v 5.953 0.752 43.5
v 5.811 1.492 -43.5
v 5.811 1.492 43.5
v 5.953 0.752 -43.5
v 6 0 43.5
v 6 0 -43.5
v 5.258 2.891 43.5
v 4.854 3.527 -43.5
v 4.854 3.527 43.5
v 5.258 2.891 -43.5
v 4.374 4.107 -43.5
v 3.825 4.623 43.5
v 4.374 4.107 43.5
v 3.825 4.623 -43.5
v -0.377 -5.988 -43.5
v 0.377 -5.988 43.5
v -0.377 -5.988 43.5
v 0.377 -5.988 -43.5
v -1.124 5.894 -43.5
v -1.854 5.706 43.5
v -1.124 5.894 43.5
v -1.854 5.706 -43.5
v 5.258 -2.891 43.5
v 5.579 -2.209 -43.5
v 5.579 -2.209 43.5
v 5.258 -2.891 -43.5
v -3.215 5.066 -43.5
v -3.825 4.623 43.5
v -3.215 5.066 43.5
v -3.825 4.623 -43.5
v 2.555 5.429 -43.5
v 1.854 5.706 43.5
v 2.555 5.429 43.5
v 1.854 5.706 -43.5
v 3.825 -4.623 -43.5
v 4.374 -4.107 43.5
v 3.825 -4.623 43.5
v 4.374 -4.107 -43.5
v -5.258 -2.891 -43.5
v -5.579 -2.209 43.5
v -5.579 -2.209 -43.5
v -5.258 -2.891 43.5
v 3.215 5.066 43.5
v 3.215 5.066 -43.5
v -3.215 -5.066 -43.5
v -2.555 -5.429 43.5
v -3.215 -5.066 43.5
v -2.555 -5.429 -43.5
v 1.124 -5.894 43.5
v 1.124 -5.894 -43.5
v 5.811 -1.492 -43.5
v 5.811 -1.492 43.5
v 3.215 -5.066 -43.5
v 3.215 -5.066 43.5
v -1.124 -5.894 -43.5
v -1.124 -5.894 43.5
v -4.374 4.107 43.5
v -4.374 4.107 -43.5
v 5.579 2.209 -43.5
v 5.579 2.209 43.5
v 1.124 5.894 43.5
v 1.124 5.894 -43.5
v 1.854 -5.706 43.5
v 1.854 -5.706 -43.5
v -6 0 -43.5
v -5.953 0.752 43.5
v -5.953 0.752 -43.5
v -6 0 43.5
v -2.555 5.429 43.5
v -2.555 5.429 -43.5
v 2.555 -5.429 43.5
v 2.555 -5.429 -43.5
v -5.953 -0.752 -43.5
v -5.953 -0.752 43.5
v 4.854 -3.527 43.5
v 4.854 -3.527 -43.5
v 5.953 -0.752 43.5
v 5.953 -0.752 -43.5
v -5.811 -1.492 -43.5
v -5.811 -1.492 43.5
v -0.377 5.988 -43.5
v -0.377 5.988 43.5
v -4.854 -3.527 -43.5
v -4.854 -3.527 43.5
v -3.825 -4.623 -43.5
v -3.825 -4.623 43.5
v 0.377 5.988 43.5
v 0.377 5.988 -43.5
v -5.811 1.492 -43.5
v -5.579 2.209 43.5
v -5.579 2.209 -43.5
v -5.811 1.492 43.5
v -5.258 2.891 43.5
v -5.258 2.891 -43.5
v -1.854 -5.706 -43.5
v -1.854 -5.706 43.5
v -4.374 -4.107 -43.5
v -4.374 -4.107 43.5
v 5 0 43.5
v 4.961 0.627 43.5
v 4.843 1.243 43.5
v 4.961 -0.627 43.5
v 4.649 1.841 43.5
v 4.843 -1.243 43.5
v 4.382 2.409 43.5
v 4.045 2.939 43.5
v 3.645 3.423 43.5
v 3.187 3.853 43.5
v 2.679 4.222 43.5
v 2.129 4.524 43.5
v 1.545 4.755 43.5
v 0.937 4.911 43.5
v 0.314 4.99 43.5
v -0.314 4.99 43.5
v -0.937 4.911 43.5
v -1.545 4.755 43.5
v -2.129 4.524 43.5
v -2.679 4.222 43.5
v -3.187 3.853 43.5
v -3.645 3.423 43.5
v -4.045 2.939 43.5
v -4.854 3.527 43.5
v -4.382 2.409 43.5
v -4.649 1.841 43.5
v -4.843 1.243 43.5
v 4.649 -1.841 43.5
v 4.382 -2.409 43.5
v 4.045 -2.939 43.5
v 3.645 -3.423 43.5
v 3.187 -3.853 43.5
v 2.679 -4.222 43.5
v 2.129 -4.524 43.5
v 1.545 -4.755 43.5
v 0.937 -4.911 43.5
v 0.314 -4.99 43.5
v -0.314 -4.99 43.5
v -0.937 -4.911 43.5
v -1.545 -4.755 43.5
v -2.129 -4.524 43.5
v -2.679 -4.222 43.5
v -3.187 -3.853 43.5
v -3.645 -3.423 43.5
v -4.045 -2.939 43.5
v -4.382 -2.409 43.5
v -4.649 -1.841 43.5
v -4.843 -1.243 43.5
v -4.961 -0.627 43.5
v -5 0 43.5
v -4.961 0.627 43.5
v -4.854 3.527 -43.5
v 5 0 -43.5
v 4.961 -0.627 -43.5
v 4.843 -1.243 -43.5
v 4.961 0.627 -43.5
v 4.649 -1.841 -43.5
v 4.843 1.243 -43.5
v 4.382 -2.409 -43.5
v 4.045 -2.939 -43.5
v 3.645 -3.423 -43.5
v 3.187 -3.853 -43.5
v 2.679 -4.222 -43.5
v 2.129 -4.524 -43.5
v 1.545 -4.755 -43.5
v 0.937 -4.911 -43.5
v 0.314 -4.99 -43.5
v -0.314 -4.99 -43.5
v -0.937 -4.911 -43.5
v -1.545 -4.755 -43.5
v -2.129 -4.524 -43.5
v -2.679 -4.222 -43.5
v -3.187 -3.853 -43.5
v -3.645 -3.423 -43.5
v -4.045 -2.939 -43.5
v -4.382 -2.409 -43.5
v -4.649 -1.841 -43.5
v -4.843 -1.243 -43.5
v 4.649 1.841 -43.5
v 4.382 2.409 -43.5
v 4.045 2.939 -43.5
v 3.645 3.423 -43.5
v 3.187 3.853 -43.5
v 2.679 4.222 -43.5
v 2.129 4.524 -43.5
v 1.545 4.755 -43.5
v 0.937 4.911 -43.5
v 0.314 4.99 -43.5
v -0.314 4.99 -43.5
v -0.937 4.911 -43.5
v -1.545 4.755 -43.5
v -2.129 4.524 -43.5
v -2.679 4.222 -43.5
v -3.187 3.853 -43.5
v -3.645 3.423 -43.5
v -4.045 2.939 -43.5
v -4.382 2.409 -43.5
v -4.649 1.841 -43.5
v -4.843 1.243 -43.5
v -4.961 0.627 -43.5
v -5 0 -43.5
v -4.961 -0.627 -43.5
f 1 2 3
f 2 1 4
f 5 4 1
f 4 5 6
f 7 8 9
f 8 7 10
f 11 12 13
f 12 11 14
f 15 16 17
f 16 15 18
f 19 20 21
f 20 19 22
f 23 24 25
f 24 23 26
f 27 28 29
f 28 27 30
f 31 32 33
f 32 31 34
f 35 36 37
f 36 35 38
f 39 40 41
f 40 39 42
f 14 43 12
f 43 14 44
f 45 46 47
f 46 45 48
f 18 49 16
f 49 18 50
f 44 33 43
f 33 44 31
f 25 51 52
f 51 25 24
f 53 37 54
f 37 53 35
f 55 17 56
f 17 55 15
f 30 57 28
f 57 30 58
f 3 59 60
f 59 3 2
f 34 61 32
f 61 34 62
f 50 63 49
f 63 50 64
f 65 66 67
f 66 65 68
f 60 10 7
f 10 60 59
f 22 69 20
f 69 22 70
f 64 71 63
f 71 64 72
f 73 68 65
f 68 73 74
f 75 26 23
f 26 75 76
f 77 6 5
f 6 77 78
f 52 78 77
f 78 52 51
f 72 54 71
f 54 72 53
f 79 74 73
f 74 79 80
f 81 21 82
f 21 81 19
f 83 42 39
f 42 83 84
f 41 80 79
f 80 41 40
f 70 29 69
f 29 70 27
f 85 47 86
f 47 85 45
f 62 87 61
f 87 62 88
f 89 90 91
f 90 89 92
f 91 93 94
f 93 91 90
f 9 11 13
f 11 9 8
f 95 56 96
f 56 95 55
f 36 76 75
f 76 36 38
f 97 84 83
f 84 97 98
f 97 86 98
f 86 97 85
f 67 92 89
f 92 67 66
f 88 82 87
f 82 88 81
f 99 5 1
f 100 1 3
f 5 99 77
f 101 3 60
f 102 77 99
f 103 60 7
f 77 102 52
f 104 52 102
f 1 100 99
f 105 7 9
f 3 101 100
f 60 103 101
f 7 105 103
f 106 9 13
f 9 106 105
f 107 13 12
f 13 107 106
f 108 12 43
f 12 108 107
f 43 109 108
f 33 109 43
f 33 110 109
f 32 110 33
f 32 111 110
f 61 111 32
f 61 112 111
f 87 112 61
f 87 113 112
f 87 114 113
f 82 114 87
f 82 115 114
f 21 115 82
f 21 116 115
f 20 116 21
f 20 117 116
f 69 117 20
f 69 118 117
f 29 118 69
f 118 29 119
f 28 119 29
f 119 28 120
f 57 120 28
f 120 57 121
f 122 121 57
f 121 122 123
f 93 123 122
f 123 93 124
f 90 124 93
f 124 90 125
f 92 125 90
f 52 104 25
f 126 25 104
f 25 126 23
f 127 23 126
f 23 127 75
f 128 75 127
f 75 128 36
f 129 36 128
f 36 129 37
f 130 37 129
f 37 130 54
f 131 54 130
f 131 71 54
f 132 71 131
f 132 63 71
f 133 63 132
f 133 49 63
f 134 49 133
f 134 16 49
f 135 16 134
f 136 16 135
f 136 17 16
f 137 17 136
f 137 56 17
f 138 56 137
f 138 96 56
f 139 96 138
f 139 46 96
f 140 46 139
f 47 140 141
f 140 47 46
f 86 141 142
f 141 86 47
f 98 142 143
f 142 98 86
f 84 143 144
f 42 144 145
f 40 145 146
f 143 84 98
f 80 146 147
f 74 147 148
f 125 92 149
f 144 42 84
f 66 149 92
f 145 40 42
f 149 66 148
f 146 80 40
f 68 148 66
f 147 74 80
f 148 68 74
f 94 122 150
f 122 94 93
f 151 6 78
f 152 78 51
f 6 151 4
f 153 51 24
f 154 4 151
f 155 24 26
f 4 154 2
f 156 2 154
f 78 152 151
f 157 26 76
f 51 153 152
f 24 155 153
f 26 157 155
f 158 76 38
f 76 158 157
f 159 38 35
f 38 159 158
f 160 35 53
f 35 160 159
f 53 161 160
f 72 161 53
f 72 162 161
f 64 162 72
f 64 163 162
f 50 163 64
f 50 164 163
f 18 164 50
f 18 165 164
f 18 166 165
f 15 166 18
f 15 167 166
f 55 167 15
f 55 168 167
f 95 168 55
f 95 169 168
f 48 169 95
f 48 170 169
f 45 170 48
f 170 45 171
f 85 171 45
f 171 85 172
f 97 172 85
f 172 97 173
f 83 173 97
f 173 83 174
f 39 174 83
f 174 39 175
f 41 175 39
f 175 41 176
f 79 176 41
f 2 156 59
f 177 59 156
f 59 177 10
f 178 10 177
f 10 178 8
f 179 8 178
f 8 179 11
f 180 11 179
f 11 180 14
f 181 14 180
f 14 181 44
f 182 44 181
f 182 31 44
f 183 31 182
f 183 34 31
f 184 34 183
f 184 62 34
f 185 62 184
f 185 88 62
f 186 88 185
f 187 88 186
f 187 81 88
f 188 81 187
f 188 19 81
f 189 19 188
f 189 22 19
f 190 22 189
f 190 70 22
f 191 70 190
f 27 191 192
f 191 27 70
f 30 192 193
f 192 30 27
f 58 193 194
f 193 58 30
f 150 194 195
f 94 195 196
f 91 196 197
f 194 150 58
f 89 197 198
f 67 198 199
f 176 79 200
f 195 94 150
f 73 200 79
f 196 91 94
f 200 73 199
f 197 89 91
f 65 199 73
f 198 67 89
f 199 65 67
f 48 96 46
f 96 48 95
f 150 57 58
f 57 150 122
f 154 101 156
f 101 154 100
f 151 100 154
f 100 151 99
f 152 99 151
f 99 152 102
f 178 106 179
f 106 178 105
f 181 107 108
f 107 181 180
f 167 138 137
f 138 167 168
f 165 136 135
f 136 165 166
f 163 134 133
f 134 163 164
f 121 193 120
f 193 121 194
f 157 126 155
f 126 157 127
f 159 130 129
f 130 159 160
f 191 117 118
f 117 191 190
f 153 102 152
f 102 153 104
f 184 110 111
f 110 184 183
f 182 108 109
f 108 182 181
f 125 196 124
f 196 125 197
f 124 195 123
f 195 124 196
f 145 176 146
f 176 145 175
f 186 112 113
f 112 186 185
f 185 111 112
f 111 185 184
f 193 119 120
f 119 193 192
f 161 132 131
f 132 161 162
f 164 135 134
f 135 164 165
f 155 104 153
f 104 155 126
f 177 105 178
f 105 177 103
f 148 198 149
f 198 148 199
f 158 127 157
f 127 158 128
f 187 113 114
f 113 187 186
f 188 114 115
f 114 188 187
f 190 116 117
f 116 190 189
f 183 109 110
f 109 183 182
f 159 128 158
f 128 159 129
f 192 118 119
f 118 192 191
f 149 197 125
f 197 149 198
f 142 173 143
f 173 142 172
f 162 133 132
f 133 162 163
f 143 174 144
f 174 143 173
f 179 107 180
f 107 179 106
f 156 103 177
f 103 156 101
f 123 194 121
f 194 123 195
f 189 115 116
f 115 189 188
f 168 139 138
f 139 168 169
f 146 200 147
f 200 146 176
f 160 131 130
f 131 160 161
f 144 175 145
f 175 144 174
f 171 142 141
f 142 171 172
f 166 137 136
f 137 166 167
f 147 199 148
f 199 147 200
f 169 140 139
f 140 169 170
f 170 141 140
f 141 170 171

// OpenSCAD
$fn = 50;


difference() {
	union() {
		translate(v = [0, 0, -43.5000000000]) {
			cylinder(h = 87, r = 6.0000000000);
		}
	}
	union() {
		translate(v = [0, 0, -100.0000000000]) {
			cylinder(h = 200, r = 5.0000000000);
		}
	}
}
